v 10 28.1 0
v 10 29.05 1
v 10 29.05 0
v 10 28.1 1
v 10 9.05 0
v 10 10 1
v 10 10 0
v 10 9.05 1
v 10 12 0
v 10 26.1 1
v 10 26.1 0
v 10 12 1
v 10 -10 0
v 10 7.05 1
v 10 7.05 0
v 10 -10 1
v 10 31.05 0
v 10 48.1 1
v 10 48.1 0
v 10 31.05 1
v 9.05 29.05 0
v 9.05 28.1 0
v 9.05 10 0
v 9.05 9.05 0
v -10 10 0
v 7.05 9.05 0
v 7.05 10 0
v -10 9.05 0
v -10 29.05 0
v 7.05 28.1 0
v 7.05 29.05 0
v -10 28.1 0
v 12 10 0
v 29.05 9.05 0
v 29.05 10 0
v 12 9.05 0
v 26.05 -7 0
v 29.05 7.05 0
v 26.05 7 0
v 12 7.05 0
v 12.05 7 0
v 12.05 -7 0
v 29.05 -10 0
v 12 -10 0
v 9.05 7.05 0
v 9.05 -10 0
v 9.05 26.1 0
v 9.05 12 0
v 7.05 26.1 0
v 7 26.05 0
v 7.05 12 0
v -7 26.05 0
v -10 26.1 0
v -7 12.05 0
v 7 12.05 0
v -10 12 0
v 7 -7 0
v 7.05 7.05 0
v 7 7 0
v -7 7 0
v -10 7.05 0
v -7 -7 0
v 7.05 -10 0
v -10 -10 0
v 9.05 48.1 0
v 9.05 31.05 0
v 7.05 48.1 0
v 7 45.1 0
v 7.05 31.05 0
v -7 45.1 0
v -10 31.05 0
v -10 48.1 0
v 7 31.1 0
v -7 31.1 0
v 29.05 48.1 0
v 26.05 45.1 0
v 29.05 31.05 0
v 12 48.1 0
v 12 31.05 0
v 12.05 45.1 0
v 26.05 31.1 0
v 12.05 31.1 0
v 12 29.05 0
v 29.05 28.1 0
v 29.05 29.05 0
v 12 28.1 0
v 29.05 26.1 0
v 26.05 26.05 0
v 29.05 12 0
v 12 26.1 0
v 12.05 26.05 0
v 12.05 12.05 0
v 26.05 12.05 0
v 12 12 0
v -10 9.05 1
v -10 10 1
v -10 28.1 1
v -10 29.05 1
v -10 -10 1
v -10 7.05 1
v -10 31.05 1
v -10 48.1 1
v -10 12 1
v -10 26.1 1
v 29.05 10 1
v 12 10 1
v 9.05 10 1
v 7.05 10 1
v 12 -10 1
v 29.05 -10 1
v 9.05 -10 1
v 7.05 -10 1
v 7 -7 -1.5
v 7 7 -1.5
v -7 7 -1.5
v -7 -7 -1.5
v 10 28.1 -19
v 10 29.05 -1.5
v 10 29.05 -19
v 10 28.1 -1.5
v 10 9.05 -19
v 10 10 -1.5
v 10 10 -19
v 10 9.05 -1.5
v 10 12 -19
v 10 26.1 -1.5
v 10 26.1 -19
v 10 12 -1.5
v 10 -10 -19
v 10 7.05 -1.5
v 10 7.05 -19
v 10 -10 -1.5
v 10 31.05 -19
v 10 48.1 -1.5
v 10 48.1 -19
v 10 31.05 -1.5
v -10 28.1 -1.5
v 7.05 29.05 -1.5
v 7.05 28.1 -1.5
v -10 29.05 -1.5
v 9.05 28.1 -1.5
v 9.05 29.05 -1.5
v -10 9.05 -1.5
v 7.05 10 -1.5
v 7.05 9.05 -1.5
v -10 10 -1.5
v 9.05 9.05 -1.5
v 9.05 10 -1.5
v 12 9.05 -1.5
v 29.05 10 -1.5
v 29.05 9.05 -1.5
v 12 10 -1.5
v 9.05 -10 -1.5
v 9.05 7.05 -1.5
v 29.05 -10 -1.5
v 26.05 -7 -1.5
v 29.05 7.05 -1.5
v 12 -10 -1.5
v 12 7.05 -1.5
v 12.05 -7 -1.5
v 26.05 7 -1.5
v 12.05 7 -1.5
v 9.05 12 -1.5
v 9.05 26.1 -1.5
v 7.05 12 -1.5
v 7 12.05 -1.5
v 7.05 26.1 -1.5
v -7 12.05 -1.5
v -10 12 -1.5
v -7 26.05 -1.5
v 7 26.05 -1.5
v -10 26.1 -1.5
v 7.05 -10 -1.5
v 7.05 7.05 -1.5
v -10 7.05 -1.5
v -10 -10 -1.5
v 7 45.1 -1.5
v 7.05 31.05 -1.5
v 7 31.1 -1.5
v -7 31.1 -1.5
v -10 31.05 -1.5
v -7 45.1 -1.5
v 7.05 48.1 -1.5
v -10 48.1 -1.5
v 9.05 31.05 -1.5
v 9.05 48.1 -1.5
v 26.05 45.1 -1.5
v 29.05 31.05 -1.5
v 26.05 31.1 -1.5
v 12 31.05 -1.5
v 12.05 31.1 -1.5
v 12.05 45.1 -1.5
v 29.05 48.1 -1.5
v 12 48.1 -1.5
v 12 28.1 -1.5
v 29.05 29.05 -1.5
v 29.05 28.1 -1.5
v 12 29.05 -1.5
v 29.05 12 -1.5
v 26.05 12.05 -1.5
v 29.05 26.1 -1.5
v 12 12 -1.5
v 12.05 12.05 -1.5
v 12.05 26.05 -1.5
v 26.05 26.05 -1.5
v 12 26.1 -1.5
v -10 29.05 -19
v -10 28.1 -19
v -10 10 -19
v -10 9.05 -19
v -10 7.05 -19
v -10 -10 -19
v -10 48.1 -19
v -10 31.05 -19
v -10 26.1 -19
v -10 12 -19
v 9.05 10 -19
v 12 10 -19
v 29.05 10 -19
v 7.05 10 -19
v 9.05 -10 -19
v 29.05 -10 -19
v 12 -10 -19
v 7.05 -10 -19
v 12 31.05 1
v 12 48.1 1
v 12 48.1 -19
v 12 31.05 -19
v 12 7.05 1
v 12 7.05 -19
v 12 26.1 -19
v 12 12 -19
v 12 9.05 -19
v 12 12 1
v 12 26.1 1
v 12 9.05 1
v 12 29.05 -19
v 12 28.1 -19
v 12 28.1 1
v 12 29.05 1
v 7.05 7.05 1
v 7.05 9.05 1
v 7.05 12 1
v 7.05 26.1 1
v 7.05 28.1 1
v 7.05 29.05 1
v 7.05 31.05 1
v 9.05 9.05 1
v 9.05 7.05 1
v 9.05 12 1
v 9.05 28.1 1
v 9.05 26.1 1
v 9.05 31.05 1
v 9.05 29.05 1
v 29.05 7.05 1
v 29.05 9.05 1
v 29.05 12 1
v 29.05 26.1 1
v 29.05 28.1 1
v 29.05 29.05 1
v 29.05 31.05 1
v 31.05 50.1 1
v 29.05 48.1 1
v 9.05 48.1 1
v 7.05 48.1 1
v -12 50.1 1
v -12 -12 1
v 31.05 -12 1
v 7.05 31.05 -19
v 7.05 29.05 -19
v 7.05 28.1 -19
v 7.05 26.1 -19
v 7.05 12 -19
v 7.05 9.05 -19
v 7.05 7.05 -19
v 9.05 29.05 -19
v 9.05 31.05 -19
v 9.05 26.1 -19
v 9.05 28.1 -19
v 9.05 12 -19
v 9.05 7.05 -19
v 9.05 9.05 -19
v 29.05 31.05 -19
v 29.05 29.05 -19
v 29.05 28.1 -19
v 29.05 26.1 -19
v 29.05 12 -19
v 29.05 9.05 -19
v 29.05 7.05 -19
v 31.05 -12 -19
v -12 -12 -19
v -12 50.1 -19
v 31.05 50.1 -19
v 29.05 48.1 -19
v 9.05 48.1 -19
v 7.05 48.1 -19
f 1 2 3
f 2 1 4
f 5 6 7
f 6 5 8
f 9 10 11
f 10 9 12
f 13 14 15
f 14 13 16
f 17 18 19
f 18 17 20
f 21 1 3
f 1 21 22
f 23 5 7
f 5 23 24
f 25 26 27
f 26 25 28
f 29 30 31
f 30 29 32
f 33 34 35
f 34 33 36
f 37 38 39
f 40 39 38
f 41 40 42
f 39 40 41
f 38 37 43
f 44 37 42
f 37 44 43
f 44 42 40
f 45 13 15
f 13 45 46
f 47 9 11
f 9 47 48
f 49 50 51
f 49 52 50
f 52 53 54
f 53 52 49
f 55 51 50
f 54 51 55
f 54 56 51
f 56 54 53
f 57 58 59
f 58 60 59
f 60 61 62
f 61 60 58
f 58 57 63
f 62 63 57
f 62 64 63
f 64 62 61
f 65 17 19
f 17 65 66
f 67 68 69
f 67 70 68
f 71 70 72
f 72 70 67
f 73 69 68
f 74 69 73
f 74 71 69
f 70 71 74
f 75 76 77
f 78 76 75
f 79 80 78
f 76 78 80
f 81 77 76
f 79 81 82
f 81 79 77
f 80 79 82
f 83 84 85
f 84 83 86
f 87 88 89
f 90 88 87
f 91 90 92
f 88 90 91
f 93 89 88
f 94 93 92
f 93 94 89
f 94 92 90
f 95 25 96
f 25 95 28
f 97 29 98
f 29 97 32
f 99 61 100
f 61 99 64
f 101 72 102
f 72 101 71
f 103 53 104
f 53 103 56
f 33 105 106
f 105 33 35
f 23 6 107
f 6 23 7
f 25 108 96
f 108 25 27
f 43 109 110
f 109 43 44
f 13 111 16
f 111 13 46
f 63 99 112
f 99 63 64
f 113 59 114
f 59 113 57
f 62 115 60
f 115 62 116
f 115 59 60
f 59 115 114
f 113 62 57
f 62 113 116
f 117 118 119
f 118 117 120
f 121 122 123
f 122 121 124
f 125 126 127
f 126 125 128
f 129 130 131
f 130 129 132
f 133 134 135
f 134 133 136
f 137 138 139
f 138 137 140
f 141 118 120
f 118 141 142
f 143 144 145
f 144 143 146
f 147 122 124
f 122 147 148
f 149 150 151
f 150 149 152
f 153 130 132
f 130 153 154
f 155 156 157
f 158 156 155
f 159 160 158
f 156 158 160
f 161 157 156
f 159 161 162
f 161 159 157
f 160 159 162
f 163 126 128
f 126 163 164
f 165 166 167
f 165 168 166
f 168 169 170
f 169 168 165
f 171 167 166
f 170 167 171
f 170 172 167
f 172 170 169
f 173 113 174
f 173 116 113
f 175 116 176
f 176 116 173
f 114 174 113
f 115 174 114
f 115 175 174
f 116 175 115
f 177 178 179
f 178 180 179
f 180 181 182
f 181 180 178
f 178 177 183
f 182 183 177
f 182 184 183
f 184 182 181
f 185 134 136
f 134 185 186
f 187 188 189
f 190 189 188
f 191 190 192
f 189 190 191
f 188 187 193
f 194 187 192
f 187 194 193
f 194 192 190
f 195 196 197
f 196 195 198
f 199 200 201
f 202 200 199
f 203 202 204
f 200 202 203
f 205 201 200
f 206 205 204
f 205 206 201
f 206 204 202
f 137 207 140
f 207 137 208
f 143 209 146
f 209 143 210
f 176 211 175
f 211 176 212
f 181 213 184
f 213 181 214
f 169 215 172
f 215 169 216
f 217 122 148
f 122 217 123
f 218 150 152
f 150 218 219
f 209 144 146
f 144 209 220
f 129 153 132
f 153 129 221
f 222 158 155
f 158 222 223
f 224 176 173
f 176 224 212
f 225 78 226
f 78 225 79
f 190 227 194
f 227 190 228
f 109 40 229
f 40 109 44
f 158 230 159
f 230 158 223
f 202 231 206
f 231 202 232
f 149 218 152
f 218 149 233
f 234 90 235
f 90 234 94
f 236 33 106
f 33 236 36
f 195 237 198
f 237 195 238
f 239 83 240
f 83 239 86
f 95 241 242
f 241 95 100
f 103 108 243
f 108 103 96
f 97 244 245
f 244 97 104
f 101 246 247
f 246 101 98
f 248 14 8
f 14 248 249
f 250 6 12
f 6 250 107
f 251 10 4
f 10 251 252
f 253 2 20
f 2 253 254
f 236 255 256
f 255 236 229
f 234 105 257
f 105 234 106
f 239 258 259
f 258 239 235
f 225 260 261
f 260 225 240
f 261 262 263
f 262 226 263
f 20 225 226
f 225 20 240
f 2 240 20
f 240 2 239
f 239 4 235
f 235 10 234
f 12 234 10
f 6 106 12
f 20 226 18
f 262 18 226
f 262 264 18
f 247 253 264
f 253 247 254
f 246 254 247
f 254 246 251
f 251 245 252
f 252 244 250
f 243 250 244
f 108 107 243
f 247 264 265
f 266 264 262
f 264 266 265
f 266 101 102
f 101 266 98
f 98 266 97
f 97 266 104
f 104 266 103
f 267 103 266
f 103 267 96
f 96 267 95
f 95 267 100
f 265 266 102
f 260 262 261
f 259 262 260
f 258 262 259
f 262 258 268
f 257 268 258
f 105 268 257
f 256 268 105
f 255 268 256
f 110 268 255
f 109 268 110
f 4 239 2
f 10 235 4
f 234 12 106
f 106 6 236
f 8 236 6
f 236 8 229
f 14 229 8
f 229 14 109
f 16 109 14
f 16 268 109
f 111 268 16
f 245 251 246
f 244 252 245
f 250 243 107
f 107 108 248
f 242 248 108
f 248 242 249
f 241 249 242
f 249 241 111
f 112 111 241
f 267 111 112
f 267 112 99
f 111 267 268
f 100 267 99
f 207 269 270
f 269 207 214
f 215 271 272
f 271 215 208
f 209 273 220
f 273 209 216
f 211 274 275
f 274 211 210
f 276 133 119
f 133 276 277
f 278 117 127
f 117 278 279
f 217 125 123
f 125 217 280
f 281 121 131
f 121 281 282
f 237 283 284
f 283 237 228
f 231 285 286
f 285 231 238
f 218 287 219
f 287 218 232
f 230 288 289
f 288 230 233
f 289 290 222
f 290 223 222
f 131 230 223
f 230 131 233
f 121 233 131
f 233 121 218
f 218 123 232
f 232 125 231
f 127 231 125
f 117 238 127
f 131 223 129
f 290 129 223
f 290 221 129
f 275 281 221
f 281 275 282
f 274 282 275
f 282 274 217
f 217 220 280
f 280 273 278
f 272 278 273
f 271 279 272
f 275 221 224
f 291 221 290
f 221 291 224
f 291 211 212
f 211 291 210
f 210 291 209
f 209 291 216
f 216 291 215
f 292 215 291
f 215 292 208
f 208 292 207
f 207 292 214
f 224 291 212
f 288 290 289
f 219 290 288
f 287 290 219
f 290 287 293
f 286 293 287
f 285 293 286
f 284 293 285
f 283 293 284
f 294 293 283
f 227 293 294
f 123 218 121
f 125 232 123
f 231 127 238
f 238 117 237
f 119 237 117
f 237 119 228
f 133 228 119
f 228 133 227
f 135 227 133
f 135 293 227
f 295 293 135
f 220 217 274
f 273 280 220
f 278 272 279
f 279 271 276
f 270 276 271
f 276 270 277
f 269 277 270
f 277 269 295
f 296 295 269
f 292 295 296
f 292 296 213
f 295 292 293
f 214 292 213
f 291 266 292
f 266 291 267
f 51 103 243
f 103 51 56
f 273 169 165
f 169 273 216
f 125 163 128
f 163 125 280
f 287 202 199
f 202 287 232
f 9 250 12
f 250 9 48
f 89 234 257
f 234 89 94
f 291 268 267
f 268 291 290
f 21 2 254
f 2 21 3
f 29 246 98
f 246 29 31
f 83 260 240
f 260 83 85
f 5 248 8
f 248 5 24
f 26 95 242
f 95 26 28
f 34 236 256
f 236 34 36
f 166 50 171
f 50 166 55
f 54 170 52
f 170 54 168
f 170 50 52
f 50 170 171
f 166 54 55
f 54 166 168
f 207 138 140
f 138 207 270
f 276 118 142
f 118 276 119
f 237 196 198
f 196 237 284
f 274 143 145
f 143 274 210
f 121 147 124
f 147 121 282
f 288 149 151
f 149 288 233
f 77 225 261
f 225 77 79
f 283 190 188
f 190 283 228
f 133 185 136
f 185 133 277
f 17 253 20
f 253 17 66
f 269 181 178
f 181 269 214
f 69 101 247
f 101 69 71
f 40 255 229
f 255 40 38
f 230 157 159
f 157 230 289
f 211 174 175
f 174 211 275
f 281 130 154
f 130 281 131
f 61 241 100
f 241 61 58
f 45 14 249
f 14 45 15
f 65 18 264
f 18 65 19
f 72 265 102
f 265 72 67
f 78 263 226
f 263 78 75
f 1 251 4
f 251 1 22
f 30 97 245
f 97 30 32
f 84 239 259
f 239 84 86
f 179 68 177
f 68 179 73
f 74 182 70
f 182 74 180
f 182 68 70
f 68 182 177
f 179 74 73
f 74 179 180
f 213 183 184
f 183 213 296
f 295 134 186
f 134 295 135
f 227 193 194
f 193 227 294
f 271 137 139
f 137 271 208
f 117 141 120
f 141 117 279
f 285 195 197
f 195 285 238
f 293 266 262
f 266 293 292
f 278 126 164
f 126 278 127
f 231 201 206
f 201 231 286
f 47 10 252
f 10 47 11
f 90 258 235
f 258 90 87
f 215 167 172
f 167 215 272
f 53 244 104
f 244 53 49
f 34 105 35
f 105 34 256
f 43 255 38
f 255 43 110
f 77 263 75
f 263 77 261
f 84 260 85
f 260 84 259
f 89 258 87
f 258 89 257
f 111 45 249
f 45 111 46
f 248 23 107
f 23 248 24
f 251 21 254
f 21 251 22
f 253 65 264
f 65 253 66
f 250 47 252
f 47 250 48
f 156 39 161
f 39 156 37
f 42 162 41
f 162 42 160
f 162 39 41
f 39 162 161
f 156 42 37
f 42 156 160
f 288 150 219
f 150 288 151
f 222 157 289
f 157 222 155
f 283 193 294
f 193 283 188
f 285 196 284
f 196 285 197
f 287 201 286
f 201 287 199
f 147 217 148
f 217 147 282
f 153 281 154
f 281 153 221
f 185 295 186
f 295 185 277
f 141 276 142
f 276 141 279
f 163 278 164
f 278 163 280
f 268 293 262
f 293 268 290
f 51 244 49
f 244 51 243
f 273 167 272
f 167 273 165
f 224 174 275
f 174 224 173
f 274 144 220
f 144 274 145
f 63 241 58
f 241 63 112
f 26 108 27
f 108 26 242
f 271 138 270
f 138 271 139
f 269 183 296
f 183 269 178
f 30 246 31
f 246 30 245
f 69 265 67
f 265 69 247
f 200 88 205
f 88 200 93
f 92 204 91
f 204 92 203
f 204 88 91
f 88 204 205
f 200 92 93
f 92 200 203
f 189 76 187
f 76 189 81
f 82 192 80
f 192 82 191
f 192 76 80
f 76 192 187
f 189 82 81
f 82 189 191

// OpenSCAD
// Generated by SolidPython 1.1.3 on 2024-12-14 22:49:13


union() {
	translate(v = [0.0000000000, 0.0000000000, 0]) {
		difference() {
			translate(v = [-12, -12, -19]) {
				cube(size = [24, 24, 20]);
			}
			union() {
				translate(v = [-10, -10, 0]) {
					cube(size = [20, 20, 10]);
				}
				translate(v = [-7, -7, -49]) {
					cube(size = [14, 14, 50]);
				}
				translate(v = [-10, -10, -51.5000000000]) {
					cube(size = [20, 20, 50]);
				}
			}
		}
	}
	translate(v = [0.0000000000, 19.0500000000, 0]) {
		difference() {
			translate(v = [-12, -12, -19]) {
				cube(size = [24, 24, 20]);
			}
			union() {
				translate(v = [-10, -10, 0]) {
					cube(size = [20, 20, 10]);
				}
				translate(v = [-7, -7, -49]) {
					cube(size = [14, 14, 50]);
				}
				translate(v = [-10, -10, -51.5000000000]) {
					cube(size = [20, 20, 50]);
				}
			}
		}
	}
	translate(v = [0.0000000000, 38.1000000000, 0]) {
		difference() {
			translate(v = [-12, -12, -19]) {
				cube(size = [24, 24, 20]);
			}
			union() {
				translate(v = [-10, -10, 0]) {
					cube(size = [20, 20, 10]);
				}
				translate(v = [-7, -7, -49]) {
					cube(size = [14, 14, 50]);
				}
				translate(v = [-10, -10, -51.5000000000]) {
					cube(size = [20, 20, 50]);
				}
			}
		}
	}
	translate(v = [19.0500000000, 0.0000000000, 0]) {
		difference() {
			translate(v = [-12, -12, -19]) {
				cube(size = [24, 24, 20]);
			}
			union() {
				translate(v = [-10, -10, 0]) {
					cube(size = [20, 20, 10]);
				}
				translate(v = [-7, -7, -49]) {
					cube(size = [14, 14, 50]);
				}
				translate(v = [-10, -10, -51.5000000000]) {
					cube(size = [20, 20, 50]);
				}
			}
		}
	}
	translate(v = [19.0500000000, 19.0500000000, 0]) {
		difference() {
			translate(v = [-12, -12, -19]) {
				cube(size = [24, 24, 20]);
			}
			union() {
				translate(v = [-10, -10, 0]) {
					cube(size = [20, 20, 10]);
				}
				translate(v = [-7, -7, -49]) {
					cube(size = [14, 14, 50]);
				}
				translate(v = [-10, -10, -51.5000000000]) {
					cube(size = [20, 20, 50]);
				}
			}
		}
	}
	translate(v = [19.0500000000, 38.1000000000, 0]) {
		difference() {
			translate(v = [-12, -12, -19]) {
				cube(size = [24, 24, 20]);
			}
			union() {
				translate(v = [-10, -10, 0]) {
					cube(size = [20, 20, 10]);
				}
				translate(v = [-7, -7, -49]) {
					cube(size = [14, 14, 50]);
				}
				translate(v = [-10, -10, -51.5000000000]) {
					cube(size = [20, 20, 50]);
				}
			}
		}
	}
}
/***********************************************
*********      SolidPython code:      **********
************************************************
 
from solid import *

# ケースになる部分
body = translate([-12, -12, -19])(
    cube([24, 24, 20])
)

# ケースからカットする部分
hole = union()(
    # スイッチの上側をカットする部分
    translate([-10, -10, 0])(
        cube([20, 20, 10])
    ),
    # スイッチの穴
    translate([-7, -7, -49])(
        cube([14, 14, 50])
    ),
    # スイッチプレートの下側
    translate([-10, -10, -51.5])(
        cube([20, 20, 50])
    ),
)

kbd = difference()(
    body,
    hole
)

position = [
    [19.05 * 0, 19.05 * 0],
    [19.05 * 0, 19.05 * 1],
    [19.05 * 0, 19.05 * 2],
    [19.05 * 1, 19.05 * 0],
    [19.05 * 1, 19.05 * 1],
    [19.05 * 1, 19.05 * 2],
]

kbd6u = union()(
    [translate([x, y, 0])(kbd) for x, y in position]
)

scad_render_to_file(kbd6u, '4_6keys.scad')
 
 
************************************************/
